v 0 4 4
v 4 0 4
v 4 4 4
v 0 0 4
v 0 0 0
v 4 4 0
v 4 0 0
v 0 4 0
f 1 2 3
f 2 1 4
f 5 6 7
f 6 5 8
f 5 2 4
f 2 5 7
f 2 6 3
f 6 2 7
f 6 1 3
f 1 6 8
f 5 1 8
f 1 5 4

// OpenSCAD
// cube_param.scad
// param: size=10
module param_cube(size=10) {
    cube(size=4.0);
}
param_cube(size=10);
